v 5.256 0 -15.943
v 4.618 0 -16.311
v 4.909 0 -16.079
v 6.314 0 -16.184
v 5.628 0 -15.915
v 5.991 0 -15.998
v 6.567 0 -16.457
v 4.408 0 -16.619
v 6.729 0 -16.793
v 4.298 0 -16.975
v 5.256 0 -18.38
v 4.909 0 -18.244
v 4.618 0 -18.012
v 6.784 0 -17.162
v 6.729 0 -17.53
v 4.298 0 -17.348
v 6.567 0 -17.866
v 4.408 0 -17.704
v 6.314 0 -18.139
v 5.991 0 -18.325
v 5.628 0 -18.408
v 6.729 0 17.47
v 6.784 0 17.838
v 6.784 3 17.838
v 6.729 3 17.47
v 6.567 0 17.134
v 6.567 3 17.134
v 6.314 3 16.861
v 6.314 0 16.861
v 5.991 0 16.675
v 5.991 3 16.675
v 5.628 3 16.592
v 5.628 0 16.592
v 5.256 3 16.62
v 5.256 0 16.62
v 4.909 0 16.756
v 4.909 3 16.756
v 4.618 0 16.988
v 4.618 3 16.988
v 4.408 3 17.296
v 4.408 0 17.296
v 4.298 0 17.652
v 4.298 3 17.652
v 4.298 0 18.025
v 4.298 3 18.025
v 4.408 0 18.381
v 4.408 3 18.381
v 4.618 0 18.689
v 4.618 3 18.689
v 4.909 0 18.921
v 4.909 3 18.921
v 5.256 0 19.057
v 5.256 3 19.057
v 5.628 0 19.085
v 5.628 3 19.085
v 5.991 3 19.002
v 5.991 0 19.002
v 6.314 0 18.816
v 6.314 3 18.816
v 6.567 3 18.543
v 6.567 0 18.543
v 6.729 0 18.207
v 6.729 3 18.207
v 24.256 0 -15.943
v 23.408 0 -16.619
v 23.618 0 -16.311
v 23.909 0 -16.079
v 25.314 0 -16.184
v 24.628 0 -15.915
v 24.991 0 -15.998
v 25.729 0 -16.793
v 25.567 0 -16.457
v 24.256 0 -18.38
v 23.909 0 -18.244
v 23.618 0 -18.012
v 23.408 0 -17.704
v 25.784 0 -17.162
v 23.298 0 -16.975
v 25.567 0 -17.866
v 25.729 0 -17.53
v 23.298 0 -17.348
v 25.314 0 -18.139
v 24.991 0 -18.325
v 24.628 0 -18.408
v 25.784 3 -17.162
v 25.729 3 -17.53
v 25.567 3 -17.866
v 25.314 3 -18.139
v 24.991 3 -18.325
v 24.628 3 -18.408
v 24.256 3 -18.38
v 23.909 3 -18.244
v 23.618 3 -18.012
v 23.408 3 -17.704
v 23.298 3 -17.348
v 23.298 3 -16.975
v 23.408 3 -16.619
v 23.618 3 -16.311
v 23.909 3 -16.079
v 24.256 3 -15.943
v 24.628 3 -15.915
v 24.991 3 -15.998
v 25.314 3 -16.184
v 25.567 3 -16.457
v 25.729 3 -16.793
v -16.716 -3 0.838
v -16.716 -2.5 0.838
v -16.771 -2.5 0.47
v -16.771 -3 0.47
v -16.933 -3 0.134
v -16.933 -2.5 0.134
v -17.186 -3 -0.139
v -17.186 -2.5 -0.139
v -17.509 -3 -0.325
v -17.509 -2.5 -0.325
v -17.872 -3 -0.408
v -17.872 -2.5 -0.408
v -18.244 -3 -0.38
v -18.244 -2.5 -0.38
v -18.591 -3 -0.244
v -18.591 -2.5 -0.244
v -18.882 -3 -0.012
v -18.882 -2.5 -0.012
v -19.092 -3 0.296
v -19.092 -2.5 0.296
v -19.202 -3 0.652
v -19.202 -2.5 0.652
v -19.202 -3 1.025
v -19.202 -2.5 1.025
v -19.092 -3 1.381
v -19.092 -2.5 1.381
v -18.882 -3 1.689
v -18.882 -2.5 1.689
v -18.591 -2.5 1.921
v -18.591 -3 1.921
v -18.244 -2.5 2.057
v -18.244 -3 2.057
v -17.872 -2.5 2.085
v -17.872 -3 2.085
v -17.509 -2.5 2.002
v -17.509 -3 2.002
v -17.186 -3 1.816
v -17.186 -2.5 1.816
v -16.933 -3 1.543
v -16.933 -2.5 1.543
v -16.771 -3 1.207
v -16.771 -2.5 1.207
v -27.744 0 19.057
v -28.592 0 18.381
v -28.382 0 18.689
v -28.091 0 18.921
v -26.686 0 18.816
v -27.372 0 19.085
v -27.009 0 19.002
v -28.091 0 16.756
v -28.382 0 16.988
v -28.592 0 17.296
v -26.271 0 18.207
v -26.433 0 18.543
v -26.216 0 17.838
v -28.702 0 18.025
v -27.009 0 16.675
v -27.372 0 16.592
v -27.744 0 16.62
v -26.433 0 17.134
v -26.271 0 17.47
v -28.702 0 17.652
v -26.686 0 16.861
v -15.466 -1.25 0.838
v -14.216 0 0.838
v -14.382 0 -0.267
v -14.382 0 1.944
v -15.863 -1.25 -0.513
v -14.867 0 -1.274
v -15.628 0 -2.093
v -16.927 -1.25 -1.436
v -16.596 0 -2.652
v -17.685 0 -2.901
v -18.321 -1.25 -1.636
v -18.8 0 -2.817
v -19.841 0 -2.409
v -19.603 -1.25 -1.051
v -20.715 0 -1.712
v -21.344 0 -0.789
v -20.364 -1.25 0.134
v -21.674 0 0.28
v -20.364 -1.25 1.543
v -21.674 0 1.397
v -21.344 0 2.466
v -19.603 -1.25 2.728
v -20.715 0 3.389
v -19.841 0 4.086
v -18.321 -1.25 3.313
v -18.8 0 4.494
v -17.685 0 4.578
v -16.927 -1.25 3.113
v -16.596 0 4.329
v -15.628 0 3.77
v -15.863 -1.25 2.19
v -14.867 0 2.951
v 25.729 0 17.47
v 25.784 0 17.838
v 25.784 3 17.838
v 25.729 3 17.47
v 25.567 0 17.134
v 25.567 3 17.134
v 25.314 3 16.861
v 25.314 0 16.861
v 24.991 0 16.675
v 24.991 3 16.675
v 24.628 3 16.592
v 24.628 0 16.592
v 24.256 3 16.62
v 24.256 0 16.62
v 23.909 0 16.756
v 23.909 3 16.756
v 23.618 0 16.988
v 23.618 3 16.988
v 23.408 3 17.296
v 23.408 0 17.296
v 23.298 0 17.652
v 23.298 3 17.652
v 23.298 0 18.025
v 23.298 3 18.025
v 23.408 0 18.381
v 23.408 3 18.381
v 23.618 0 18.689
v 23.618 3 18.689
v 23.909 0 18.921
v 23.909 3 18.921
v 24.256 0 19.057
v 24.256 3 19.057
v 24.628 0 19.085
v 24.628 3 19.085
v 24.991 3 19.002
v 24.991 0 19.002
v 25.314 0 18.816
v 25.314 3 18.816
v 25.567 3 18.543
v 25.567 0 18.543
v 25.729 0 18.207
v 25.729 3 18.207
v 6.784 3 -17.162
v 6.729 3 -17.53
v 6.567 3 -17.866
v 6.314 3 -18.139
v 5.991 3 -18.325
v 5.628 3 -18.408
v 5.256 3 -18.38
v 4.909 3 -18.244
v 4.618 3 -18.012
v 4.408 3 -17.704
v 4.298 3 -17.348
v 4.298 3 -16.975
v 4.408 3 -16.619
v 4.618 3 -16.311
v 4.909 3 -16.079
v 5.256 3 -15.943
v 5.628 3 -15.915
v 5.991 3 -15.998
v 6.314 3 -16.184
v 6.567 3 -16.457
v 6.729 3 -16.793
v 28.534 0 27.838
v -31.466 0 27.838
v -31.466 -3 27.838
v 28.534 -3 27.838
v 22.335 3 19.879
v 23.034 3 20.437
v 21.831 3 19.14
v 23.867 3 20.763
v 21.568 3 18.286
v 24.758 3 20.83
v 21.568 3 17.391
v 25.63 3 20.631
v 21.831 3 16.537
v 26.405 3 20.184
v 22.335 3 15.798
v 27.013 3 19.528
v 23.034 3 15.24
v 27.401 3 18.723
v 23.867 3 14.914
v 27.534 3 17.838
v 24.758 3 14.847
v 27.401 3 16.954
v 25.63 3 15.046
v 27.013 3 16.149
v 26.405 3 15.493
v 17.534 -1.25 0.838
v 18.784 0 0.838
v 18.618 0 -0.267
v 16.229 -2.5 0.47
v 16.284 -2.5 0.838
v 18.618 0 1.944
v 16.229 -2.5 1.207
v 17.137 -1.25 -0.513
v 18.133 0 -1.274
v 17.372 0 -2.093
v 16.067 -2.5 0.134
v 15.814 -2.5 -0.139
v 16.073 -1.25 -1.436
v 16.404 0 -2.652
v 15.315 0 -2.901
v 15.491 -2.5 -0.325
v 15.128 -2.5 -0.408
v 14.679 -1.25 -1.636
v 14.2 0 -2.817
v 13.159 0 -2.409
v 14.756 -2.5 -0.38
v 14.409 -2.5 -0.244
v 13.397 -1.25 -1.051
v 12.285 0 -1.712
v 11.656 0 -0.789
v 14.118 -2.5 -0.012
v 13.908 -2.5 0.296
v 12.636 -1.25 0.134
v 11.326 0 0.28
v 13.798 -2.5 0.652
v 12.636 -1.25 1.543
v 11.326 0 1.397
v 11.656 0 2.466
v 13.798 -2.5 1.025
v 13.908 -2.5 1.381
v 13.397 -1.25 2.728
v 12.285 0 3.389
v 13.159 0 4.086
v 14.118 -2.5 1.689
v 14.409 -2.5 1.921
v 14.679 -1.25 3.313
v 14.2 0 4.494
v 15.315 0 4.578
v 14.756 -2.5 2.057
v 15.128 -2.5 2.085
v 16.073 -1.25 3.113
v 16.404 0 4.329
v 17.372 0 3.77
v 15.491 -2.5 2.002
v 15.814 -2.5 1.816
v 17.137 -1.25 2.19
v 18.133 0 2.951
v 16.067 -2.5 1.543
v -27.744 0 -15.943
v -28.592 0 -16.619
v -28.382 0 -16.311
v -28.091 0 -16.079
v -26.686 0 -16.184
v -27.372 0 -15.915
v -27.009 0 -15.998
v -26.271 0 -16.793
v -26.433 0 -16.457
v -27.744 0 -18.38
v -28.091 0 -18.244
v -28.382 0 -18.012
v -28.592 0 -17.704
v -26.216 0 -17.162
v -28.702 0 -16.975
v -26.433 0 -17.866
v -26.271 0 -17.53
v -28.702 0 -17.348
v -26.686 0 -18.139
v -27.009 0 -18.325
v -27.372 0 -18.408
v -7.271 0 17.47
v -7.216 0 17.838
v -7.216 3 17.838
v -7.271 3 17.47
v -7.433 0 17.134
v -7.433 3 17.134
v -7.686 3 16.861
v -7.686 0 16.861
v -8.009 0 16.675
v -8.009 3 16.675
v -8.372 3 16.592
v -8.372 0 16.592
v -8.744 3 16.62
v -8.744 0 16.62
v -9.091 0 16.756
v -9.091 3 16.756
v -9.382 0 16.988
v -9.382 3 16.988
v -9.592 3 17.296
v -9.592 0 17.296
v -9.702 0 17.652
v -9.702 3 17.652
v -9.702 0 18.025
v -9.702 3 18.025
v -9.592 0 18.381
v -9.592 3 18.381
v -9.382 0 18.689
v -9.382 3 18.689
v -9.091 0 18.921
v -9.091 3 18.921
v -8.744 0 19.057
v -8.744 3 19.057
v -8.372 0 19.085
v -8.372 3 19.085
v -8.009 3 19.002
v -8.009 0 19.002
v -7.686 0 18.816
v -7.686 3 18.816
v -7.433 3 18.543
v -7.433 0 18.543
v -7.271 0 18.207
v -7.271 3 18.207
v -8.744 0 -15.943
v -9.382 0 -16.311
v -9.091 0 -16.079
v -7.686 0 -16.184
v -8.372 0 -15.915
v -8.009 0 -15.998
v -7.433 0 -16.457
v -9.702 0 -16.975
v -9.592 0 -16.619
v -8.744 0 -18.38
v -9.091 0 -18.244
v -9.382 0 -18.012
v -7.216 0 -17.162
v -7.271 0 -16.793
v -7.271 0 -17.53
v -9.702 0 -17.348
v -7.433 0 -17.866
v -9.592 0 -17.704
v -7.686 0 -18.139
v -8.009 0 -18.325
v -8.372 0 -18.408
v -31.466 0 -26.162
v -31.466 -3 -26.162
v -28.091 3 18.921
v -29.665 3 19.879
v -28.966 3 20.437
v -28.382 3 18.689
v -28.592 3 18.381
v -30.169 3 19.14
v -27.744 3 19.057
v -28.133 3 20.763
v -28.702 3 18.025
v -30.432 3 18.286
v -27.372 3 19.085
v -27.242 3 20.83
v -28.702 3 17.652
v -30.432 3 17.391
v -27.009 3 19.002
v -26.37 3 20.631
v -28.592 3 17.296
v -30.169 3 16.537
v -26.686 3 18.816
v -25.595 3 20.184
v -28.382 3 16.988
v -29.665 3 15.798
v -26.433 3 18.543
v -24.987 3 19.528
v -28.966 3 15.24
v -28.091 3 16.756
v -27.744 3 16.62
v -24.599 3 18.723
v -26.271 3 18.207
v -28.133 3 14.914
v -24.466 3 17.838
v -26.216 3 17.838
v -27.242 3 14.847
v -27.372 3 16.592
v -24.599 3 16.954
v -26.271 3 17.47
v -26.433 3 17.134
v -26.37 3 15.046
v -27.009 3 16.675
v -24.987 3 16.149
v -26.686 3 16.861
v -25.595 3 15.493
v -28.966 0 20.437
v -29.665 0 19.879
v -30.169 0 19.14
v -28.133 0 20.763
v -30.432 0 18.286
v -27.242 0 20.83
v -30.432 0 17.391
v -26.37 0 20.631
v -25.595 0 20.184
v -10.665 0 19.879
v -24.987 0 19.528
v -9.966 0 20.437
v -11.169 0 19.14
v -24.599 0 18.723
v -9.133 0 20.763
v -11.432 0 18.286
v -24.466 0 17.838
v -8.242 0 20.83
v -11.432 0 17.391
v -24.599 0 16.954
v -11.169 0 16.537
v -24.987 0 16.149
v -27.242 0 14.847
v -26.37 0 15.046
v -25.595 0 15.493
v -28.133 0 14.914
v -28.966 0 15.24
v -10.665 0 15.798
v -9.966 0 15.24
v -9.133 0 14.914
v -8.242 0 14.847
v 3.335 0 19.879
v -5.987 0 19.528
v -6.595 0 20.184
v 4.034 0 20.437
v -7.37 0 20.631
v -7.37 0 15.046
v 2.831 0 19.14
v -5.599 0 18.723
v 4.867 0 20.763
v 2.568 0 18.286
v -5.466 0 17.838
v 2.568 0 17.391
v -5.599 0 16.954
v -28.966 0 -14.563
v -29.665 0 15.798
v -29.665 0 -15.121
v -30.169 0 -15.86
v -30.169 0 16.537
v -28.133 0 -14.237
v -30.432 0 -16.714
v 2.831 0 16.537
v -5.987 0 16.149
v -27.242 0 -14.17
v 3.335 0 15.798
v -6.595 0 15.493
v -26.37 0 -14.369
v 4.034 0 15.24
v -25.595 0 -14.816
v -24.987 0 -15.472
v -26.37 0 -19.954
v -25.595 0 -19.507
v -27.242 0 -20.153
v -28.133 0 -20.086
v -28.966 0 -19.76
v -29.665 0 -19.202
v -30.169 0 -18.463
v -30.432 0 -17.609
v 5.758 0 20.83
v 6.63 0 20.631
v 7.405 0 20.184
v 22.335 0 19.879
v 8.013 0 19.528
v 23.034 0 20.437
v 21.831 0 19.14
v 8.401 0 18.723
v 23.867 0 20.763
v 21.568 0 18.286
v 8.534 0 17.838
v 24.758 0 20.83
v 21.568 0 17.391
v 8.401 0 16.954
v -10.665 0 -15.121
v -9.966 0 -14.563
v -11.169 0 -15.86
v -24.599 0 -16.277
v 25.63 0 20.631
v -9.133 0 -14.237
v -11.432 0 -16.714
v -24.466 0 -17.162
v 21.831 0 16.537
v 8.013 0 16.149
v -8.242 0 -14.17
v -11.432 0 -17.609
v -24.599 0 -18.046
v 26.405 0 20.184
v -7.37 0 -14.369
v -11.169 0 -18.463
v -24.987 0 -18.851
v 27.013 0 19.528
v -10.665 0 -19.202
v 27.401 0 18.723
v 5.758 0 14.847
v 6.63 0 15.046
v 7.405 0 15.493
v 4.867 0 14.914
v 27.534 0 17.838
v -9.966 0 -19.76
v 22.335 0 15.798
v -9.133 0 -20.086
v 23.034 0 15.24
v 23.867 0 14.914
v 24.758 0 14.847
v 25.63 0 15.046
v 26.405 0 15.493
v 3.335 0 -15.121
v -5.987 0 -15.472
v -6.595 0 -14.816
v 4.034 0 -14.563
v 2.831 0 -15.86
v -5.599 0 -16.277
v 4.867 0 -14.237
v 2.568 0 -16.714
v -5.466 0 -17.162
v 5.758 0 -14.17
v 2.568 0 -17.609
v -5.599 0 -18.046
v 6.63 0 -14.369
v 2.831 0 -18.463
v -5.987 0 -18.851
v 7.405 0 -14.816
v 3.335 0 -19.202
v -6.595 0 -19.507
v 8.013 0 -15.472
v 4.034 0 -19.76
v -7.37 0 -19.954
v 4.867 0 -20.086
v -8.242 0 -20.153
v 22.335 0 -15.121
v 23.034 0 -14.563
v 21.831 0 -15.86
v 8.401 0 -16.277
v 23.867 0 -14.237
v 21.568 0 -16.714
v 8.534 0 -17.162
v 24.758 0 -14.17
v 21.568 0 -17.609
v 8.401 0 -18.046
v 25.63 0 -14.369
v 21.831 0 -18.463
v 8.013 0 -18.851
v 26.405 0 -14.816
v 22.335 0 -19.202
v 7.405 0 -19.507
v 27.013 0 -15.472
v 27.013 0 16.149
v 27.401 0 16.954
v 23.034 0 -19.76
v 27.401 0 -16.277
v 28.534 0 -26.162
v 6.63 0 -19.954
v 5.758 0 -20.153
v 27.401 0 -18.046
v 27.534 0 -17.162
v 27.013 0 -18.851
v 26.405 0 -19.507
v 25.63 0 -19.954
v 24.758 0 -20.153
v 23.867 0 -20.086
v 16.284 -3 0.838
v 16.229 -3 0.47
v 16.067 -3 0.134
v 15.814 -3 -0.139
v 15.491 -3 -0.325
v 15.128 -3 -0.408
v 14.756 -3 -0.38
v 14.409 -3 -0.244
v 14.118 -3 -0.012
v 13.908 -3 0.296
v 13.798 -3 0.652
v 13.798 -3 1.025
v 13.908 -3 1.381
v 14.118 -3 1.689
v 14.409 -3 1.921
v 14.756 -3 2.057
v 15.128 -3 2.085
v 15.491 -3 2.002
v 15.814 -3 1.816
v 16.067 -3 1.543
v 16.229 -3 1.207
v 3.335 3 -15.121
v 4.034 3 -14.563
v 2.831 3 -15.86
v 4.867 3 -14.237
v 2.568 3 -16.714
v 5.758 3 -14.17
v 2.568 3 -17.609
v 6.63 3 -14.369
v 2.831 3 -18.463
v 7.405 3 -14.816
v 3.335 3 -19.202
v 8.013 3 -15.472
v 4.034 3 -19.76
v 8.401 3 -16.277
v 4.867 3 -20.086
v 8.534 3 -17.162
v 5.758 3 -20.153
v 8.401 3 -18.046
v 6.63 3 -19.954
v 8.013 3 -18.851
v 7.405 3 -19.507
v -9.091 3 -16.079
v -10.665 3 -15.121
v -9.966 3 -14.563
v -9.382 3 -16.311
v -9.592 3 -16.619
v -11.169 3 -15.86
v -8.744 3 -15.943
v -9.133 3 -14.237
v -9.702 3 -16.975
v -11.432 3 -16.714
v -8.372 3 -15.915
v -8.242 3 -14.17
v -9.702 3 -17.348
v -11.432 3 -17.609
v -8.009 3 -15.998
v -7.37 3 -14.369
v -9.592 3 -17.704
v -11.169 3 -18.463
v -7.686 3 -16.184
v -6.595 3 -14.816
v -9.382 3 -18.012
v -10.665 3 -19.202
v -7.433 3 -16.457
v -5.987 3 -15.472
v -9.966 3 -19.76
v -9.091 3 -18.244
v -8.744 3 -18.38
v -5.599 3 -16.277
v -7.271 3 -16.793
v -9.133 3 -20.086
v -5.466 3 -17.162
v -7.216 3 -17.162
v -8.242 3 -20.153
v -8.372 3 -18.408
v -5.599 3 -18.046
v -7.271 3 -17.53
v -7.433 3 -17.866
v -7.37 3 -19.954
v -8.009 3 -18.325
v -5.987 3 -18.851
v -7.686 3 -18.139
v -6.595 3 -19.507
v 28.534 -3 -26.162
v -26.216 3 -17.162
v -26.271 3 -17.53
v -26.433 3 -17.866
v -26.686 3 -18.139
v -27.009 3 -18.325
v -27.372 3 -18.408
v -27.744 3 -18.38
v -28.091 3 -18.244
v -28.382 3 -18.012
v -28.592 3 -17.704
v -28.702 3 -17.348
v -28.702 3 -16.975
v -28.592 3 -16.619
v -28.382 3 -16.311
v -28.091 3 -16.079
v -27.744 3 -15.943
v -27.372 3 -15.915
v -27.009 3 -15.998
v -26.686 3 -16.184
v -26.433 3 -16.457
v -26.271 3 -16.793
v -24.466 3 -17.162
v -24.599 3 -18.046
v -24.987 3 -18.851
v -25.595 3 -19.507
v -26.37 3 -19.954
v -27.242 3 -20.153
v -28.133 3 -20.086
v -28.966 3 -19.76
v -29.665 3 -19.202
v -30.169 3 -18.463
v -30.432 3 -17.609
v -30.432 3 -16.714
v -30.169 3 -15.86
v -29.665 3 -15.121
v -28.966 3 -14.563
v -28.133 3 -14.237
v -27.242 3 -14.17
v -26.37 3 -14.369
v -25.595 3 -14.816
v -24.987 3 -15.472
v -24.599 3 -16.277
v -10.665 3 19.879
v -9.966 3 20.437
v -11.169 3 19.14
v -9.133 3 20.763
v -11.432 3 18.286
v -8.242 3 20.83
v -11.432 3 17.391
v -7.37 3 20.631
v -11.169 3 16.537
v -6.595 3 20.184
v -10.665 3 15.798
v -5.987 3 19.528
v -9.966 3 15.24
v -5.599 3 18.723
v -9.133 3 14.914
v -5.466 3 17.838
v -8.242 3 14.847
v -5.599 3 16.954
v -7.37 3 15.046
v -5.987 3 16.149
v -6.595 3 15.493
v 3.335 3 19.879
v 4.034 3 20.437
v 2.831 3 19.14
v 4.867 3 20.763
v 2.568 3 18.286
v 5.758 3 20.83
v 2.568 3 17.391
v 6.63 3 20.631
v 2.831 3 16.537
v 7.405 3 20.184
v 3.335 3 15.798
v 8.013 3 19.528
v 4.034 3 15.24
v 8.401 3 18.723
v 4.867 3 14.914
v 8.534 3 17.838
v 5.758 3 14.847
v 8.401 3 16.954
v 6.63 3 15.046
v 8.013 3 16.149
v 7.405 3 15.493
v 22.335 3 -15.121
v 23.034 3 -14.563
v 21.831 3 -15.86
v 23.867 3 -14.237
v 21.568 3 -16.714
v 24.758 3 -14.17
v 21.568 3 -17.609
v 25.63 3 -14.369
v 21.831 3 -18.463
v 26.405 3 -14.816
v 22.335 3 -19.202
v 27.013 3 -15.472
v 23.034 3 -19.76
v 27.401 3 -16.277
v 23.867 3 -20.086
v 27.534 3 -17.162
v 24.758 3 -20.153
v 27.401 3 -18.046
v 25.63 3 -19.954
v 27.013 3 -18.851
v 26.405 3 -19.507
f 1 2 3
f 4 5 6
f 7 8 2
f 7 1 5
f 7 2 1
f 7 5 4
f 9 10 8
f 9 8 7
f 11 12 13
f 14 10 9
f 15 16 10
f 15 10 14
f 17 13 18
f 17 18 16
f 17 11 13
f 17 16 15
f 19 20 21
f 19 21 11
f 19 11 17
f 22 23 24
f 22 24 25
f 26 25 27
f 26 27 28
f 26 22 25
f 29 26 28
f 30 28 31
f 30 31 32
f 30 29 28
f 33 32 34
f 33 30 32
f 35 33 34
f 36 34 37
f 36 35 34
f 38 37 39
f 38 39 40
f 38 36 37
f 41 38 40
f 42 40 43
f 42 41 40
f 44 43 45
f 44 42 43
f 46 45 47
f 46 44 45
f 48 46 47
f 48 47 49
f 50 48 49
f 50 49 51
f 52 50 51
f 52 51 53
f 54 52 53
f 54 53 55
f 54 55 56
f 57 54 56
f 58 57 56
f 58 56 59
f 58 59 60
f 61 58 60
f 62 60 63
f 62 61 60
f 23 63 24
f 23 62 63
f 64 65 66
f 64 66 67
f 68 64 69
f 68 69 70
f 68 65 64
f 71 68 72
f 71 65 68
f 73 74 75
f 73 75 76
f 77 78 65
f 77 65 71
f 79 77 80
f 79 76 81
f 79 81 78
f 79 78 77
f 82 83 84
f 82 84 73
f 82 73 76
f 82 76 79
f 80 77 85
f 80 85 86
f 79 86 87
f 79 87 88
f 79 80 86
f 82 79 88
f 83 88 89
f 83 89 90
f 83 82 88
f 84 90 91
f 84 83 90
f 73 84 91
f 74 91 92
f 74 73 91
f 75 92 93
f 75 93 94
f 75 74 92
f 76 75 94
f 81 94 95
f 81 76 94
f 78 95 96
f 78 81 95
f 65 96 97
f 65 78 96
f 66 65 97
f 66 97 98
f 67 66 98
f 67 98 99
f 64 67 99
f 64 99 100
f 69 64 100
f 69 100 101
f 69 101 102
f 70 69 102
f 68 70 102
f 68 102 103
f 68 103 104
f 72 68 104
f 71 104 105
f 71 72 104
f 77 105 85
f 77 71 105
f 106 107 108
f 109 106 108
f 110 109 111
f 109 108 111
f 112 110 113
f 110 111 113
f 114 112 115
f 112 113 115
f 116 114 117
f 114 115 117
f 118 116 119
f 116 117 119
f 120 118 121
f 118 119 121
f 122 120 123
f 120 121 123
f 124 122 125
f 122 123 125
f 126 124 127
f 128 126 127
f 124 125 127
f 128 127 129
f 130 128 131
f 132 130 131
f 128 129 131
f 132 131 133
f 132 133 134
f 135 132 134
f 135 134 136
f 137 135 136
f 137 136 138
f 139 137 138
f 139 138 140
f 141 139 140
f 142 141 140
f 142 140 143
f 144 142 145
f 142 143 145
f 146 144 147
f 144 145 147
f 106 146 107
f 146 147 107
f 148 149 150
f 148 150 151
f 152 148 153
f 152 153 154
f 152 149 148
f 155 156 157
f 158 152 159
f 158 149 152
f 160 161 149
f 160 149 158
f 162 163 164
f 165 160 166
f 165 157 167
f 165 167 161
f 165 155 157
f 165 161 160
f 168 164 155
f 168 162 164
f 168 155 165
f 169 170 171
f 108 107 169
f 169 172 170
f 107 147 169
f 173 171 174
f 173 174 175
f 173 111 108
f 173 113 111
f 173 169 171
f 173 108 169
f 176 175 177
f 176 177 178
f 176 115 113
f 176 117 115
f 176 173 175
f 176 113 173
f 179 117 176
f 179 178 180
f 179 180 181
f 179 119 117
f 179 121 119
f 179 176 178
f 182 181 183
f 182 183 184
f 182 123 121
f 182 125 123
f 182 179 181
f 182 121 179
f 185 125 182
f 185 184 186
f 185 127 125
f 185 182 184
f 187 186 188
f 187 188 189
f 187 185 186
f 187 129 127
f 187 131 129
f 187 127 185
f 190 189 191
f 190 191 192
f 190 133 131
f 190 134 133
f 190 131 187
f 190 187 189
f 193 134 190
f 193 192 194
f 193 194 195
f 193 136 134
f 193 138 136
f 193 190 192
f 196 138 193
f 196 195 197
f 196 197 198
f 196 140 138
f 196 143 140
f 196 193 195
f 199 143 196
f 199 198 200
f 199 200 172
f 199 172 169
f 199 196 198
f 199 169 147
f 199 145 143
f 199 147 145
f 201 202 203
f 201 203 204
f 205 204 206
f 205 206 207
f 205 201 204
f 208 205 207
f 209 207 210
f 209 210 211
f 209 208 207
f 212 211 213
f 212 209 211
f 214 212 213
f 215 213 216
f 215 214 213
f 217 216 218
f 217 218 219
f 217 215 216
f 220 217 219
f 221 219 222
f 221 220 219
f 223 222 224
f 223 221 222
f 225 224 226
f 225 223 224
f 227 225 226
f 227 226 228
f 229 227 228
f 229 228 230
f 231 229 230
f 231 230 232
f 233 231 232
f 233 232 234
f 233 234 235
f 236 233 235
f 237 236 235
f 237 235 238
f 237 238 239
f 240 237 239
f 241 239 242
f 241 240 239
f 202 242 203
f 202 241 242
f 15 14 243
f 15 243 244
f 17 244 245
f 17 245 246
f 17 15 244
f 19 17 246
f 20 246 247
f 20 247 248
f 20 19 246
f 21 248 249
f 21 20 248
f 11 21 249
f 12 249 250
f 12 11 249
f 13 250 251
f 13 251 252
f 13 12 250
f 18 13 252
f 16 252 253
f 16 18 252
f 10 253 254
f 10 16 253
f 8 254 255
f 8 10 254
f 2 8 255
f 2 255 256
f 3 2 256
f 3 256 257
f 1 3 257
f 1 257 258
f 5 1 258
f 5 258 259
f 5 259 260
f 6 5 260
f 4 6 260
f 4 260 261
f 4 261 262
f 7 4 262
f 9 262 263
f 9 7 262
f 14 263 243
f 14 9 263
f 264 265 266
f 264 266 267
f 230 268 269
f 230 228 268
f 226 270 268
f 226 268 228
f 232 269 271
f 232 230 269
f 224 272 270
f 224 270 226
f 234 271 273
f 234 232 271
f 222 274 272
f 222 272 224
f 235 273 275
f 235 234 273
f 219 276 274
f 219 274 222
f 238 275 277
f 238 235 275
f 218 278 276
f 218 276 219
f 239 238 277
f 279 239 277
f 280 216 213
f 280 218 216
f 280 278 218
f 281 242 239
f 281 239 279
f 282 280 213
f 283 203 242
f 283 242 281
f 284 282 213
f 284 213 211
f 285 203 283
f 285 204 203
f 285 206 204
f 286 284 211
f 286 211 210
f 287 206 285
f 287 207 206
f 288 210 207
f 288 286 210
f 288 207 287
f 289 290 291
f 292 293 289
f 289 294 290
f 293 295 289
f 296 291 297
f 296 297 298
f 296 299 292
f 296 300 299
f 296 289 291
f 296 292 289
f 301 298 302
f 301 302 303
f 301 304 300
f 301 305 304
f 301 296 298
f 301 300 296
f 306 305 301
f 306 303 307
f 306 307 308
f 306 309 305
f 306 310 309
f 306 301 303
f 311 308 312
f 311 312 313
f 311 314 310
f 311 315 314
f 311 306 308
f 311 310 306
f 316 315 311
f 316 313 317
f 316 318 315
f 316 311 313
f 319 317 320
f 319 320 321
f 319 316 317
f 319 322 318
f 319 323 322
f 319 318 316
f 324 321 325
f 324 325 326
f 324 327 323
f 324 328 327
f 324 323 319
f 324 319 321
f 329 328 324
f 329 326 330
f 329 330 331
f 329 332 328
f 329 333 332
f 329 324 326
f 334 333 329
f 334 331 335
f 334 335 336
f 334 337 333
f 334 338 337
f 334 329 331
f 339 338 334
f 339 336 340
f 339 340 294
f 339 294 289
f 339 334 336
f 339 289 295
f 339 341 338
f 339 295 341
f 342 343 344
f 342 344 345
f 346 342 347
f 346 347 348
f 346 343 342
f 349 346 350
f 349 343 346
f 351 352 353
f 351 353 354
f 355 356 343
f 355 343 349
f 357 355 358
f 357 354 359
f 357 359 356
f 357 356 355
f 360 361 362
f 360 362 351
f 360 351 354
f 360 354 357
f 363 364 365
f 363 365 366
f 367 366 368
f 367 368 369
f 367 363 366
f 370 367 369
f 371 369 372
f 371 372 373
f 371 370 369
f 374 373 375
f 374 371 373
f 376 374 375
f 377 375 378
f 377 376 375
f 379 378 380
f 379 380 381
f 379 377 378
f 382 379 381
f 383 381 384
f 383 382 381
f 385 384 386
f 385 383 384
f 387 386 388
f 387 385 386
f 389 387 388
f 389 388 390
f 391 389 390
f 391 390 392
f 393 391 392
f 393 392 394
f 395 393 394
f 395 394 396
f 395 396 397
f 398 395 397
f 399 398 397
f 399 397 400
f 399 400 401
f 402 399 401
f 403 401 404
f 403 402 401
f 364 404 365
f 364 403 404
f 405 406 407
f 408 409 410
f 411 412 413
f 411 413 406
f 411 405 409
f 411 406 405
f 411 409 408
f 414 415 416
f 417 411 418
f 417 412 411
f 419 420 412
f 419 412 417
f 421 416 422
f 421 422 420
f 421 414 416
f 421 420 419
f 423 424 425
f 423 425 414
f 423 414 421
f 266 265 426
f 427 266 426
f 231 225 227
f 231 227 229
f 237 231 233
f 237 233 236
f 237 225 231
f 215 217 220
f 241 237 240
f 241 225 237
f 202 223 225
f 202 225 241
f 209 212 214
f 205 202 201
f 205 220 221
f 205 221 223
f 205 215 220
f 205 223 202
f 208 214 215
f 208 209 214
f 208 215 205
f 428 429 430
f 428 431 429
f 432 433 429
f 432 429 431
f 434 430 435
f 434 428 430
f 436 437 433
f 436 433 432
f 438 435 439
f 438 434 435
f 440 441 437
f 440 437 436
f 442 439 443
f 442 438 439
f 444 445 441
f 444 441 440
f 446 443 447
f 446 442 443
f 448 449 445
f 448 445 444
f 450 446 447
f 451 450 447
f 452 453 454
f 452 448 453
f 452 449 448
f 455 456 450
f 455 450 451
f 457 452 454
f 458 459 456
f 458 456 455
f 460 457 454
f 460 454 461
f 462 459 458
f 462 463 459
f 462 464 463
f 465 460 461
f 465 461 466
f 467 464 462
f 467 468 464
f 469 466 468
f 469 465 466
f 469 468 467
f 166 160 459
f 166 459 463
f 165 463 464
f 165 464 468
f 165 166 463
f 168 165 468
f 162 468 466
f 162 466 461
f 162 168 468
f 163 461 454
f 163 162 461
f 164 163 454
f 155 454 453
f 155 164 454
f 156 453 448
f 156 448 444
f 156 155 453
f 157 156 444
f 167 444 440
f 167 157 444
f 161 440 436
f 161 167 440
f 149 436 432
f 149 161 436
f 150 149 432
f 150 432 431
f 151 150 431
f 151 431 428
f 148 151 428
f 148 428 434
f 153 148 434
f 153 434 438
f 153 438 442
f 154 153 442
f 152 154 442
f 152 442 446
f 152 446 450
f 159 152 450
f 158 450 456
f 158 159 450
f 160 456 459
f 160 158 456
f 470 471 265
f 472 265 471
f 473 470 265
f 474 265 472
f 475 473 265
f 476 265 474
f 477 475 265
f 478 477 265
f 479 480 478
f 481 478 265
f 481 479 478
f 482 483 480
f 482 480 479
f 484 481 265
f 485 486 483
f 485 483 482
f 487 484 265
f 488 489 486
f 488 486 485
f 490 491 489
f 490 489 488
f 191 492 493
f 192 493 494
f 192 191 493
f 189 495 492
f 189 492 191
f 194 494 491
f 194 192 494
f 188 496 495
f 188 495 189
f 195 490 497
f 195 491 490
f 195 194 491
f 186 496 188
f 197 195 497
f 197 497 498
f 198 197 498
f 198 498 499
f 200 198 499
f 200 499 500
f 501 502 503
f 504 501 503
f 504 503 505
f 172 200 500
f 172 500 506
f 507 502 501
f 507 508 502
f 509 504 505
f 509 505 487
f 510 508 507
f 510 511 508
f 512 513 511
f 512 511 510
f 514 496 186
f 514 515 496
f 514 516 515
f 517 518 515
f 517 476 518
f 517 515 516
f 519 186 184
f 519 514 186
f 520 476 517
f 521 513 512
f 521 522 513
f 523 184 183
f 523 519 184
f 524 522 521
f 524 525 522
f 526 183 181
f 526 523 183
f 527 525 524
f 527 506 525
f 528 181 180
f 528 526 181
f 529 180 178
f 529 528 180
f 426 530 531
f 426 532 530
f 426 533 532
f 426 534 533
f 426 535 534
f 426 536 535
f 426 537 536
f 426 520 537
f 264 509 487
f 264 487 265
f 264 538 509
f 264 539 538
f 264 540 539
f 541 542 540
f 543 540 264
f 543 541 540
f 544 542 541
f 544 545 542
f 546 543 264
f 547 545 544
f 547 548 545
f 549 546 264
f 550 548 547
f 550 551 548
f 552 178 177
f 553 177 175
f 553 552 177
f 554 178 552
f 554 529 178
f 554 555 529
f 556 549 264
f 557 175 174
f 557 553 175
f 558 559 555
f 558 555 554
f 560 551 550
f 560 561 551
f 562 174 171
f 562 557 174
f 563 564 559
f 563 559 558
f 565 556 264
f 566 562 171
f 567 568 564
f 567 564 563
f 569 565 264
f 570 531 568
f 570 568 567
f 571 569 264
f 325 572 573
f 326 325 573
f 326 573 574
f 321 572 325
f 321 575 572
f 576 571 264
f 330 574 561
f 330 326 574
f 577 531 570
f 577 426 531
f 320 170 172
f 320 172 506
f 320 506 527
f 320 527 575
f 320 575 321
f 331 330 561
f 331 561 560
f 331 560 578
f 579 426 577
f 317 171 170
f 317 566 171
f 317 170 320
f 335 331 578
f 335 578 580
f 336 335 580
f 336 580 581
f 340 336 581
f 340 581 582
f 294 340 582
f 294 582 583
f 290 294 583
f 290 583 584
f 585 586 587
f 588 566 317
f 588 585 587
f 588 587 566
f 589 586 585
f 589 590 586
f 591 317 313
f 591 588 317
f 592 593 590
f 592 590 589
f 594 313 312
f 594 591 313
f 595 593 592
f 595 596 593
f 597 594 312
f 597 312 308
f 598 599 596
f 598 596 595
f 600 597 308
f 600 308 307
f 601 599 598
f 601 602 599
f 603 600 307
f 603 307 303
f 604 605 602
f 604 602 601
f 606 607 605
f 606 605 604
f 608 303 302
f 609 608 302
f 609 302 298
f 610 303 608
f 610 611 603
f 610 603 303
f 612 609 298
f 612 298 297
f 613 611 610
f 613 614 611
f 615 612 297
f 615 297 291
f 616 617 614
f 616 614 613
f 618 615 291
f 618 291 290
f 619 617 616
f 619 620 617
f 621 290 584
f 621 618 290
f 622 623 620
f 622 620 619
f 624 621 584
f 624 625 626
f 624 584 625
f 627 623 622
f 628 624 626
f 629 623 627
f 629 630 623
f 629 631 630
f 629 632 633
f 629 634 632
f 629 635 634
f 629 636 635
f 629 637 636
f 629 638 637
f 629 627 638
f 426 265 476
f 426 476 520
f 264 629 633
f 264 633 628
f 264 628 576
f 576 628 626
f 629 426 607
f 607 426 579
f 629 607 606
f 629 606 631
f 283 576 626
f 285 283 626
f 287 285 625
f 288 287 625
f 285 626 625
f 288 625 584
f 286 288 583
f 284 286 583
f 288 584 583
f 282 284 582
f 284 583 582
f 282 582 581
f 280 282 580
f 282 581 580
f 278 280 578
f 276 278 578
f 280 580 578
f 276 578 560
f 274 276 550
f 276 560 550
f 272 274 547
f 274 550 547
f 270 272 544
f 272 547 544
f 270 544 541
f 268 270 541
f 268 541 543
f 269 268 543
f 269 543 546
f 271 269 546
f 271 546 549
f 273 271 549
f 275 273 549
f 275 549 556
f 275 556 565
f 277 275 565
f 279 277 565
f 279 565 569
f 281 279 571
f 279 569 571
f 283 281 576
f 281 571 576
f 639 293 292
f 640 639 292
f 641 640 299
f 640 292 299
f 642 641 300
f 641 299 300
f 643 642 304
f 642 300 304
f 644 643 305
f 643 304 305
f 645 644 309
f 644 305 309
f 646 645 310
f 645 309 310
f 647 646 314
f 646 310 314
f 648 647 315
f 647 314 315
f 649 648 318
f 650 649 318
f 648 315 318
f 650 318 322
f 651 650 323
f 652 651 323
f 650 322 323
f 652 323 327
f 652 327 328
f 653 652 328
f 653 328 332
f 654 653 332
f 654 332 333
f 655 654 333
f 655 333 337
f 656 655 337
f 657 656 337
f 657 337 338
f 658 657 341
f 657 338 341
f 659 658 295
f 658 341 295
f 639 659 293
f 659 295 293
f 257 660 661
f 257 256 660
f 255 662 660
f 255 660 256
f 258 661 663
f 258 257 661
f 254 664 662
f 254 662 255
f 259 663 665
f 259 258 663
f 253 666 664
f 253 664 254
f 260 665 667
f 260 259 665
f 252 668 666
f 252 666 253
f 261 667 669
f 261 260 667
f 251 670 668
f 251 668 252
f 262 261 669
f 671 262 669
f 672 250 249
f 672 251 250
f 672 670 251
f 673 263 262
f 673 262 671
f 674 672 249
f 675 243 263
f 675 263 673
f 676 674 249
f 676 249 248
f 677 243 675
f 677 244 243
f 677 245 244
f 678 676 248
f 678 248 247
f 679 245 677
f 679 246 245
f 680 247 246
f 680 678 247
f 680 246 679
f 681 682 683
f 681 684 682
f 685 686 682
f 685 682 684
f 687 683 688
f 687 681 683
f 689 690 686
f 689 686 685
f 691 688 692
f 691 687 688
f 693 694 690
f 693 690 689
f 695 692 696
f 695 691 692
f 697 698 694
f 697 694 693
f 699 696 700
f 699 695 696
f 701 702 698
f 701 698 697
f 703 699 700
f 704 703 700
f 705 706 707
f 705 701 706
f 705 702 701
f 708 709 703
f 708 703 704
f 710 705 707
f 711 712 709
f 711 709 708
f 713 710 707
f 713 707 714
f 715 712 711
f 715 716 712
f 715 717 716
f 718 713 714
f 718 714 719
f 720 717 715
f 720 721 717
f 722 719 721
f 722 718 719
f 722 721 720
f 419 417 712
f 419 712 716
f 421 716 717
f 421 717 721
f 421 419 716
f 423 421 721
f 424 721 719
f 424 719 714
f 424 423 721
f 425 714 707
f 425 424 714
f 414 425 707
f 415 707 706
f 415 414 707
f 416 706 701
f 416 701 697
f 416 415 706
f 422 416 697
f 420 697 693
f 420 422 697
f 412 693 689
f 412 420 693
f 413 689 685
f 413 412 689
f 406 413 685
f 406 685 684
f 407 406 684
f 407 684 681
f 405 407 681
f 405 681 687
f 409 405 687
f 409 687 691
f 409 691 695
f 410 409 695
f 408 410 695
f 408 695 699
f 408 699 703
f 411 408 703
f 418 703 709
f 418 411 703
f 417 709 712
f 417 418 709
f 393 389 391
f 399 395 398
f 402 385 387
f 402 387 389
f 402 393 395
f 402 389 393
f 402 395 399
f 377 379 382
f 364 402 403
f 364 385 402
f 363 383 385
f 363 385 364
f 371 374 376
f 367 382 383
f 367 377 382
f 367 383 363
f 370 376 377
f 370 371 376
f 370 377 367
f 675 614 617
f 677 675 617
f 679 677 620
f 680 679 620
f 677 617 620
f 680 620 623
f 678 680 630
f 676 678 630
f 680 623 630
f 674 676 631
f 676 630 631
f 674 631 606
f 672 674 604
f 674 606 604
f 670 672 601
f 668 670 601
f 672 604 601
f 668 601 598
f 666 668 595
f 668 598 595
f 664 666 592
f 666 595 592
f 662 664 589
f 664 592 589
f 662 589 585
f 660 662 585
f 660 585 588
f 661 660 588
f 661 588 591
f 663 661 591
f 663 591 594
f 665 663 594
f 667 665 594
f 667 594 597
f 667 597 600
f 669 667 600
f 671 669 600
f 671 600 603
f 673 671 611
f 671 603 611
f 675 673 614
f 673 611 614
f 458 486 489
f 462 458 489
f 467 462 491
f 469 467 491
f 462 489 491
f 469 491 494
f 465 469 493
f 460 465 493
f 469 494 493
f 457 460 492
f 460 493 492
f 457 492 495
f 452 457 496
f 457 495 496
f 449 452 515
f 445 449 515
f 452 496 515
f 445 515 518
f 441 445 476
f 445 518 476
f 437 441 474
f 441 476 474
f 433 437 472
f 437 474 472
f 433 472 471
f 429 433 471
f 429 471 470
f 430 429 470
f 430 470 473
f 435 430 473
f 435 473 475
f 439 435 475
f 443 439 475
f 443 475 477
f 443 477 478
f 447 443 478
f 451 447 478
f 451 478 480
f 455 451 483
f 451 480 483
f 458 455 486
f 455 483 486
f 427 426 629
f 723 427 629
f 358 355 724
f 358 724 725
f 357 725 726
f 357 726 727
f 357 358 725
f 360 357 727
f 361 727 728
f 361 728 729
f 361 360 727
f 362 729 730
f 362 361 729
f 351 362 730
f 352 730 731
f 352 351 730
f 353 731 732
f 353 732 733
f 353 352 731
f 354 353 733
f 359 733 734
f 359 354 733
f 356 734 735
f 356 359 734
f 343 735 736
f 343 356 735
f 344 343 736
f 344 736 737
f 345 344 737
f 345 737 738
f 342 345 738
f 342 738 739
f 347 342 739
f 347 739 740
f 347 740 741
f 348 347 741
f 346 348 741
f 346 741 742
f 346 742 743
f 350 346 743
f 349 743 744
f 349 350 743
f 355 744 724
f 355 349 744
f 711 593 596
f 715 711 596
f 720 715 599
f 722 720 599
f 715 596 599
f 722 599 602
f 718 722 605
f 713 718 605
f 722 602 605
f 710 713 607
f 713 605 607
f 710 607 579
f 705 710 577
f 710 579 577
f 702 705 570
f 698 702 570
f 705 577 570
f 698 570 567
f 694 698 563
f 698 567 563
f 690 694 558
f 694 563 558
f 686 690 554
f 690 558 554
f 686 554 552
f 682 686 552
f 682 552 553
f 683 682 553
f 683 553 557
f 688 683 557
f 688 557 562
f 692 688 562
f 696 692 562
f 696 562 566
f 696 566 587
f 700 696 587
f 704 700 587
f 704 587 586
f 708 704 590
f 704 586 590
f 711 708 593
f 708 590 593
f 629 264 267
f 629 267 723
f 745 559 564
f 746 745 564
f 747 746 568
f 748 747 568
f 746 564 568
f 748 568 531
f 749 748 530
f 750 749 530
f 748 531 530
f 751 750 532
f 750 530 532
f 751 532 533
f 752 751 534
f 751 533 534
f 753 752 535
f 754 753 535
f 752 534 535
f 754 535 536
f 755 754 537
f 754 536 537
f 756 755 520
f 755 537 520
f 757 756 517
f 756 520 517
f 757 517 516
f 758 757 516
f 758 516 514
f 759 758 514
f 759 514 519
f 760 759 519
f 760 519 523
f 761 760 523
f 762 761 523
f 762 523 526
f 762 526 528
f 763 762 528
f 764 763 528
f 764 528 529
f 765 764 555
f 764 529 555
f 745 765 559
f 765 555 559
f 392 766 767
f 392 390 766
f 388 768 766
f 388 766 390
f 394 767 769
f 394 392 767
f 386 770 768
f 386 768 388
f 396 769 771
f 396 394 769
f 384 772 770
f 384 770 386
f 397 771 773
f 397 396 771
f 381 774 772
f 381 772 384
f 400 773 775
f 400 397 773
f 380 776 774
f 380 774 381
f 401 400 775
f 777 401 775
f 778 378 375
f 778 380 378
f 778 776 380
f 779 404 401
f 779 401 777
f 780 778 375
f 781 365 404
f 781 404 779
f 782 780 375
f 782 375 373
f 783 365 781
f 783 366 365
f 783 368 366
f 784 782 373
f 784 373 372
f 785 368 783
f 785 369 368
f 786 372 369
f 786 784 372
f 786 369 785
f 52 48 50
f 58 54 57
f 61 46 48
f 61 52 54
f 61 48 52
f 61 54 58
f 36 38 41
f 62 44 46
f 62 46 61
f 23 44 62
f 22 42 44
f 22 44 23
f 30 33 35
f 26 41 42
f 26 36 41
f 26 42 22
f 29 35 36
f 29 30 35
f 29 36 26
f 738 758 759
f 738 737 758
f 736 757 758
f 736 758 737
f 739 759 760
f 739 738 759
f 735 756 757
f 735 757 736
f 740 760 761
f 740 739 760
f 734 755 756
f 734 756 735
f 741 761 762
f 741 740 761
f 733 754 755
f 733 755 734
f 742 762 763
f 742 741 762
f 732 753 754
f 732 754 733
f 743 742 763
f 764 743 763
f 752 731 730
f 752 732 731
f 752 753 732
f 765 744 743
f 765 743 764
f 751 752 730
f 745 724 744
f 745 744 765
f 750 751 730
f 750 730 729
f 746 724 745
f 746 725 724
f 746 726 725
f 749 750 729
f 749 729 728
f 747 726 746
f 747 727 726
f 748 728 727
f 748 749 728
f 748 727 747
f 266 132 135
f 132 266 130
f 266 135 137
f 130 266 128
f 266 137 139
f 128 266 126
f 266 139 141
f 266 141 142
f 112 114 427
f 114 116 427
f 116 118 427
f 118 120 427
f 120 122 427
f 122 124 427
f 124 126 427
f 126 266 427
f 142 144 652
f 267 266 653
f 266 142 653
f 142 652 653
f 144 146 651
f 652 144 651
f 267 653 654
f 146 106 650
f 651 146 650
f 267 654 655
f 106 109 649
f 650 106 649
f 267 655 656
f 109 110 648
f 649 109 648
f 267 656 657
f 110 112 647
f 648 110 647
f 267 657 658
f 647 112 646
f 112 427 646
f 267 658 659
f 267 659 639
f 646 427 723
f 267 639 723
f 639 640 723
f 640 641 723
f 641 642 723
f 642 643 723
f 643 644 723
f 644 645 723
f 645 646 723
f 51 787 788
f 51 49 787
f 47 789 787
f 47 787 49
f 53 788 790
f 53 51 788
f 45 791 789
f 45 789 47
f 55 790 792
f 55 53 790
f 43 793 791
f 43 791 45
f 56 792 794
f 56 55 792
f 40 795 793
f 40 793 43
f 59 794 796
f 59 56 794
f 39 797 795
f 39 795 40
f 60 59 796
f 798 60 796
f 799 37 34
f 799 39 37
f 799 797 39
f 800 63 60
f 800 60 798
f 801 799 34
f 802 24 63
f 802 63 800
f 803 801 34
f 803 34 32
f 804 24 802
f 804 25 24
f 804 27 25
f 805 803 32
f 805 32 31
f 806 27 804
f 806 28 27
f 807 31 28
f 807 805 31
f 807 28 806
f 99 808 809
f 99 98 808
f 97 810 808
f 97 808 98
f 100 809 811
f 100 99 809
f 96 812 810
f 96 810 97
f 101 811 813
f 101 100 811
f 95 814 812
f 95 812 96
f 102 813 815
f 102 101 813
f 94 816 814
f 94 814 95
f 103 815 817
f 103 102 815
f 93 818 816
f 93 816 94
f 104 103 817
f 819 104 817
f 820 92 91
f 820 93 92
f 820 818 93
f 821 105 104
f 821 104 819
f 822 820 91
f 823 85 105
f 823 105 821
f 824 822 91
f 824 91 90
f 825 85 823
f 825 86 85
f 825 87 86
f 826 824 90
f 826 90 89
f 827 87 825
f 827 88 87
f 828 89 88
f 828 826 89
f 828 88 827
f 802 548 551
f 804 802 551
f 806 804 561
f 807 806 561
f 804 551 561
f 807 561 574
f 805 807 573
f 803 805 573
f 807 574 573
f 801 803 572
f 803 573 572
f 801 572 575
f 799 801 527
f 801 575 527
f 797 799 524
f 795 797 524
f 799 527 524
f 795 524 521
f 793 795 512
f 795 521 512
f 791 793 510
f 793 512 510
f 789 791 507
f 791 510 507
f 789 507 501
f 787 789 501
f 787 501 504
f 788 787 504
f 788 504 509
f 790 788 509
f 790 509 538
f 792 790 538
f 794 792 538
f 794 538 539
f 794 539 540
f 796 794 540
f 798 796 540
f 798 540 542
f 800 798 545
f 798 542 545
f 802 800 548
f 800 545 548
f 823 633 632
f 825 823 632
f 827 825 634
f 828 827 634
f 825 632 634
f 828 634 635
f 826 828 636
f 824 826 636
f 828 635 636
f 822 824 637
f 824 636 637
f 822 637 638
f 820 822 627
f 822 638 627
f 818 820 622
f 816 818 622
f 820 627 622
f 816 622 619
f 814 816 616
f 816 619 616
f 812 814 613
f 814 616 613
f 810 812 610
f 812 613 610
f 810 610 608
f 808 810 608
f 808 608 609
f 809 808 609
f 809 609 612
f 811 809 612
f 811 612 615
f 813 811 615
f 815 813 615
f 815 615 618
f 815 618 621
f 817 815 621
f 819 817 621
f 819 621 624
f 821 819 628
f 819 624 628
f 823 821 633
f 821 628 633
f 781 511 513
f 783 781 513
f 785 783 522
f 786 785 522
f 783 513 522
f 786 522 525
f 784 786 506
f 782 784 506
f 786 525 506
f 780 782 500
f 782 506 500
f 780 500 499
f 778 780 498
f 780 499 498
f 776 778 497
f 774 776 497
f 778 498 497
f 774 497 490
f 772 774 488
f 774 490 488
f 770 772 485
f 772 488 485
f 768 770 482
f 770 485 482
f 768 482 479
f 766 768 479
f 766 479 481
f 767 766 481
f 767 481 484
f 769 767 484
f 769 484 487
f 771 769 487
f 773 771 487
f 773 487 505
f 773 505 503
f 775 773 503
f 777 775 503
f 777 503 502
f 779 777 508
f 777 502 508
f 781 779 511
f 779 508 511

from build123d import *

# Parameters (mm, degrees)
SKETCH_1_W          = 60
SKETCH_1_H          = 54
EXTRUDE_1_DEPTH     = 3
SKETCH_3_R          = 3
SKETCH_3_R_2        = 1.25
EXTRUDE_2_DEPTH     = 3
SKETCH_4_R          = 1.25
CUT_EXTRUDE_1_DEPTH = 3
CHAMFER_1_SIZE      = 2.5


with BuildPart() as part:
    # Эскиз1 → Бобышка-Вытянуть1 (new body)
    with BuildSketch(Plane(origin=(0, 0, 0), x_dir=(1, 0, 0), z_dir=(0, 1, 0))):
        with Locations((-1.465707965, -0.838495575)):
            Rectangle(SKETCH_1_W, SKETCH_1_H)
    extrude(amount=-EXTRUDE_1_DEPTH)

    # Эскиз3 → Бобышка-Вытянуть2 (add)
    with BuildSketch(Plane(origin=(0, 0, 0), x_dir=(1, 0, 0), z_dir=(0, 1, 0))):
        with Locations((-27.465707965, 17.161504425)):
            Circle(SKETCH_3_R)
        with Locations((-27.465707965, 17.161504425)):
            Circle(SKETCH_3_R_2, mode=Mode.SUBTRACT)
        with Locations((-27.465707965, -17.838495575)):
            Circle(SKETCH_3_R)
        with Locations((-27.465707965, -17.838495575)):
            Circle(SKETCH_3_R_2, mode=Mode.SUBTRACT)
        with Locations((-8.465707965, 17.161504425)):
            Circle(SKETCH_3_R)
        with Locations((-8.465707965, 17.161504425)):
            Circle(SKETCH_3_R_2, mode=Mode.SUBTRACT)
        with Locations((-8.465707965, -17.838495575)):
            Circle(SKETCH_3_R)
        with Locations((-8.465707965, -17.838495575)):
            Circle(SKETCH_3_R_2, mode=Mode.SUBTRACT)
        with Locations((5.534292035, -17.838495575)):
            Circle(SKETCH_3_R)
        with Locations((5.534292035, -17.838495575)):
            Circle(SKETCH_3_R_2, mode=Mode.SUBTRACT)
        with Locations((5.534292035, 17.161504425)):
            Circle(SKETCH_3_R)
        with Locations((5.534292035, 17.161504425)):
            Circle(SKETCH_3_R_2, mode=Mode.SUBTRACT)
        with Locations((24.534292035, -17.838495575)):
            Circle(SKETCH_3_R)
        with Locations((24.534292035, -17.838495575)):
            Circle(SKETCH_3_R_2, mode=Mode.SUBTRACT)
        with Locations((24.534292035, 17.161504425)):
            Circle(SKETCH_3_R)
        with Locations((24.534292035, 17.161504425)):
            Circle(SKETCH_3_R_2, mode=Mode.SUBTRACT)
    extrude(amount=EXTRUDE_2_DEPTH)

    # Эскиз4 → Вырез-Вытянуть1 (cut)
    with BuildSketch(Plane(origin=(0, 0, 0), x_dir=(1, 0, 0), z_dir=(0, 1, 0))):
        with Locations((-17.965707965, -0.838495575)):
            Circle(SKETCH_4_R)
        with Locations((15.034292035, -0.838495575)):
            Circle(SKETCH_4_R)
    extrude(amount=-CUT_EXTRUDE_1_DEPTH, mode=Mode.SUBTRACT)

    # Фаска1
    chamfer_1_edges = [part.edges().sort_by_distance(p)[0] for p in [
        (-19.215707965, 0, 0.838495575),
        (13.784292035, 0, 0.838495575),
    ]]
    chamfer(chamfer_1_edges, length=CHAMFER_1_SIZE)


solid = part.part
